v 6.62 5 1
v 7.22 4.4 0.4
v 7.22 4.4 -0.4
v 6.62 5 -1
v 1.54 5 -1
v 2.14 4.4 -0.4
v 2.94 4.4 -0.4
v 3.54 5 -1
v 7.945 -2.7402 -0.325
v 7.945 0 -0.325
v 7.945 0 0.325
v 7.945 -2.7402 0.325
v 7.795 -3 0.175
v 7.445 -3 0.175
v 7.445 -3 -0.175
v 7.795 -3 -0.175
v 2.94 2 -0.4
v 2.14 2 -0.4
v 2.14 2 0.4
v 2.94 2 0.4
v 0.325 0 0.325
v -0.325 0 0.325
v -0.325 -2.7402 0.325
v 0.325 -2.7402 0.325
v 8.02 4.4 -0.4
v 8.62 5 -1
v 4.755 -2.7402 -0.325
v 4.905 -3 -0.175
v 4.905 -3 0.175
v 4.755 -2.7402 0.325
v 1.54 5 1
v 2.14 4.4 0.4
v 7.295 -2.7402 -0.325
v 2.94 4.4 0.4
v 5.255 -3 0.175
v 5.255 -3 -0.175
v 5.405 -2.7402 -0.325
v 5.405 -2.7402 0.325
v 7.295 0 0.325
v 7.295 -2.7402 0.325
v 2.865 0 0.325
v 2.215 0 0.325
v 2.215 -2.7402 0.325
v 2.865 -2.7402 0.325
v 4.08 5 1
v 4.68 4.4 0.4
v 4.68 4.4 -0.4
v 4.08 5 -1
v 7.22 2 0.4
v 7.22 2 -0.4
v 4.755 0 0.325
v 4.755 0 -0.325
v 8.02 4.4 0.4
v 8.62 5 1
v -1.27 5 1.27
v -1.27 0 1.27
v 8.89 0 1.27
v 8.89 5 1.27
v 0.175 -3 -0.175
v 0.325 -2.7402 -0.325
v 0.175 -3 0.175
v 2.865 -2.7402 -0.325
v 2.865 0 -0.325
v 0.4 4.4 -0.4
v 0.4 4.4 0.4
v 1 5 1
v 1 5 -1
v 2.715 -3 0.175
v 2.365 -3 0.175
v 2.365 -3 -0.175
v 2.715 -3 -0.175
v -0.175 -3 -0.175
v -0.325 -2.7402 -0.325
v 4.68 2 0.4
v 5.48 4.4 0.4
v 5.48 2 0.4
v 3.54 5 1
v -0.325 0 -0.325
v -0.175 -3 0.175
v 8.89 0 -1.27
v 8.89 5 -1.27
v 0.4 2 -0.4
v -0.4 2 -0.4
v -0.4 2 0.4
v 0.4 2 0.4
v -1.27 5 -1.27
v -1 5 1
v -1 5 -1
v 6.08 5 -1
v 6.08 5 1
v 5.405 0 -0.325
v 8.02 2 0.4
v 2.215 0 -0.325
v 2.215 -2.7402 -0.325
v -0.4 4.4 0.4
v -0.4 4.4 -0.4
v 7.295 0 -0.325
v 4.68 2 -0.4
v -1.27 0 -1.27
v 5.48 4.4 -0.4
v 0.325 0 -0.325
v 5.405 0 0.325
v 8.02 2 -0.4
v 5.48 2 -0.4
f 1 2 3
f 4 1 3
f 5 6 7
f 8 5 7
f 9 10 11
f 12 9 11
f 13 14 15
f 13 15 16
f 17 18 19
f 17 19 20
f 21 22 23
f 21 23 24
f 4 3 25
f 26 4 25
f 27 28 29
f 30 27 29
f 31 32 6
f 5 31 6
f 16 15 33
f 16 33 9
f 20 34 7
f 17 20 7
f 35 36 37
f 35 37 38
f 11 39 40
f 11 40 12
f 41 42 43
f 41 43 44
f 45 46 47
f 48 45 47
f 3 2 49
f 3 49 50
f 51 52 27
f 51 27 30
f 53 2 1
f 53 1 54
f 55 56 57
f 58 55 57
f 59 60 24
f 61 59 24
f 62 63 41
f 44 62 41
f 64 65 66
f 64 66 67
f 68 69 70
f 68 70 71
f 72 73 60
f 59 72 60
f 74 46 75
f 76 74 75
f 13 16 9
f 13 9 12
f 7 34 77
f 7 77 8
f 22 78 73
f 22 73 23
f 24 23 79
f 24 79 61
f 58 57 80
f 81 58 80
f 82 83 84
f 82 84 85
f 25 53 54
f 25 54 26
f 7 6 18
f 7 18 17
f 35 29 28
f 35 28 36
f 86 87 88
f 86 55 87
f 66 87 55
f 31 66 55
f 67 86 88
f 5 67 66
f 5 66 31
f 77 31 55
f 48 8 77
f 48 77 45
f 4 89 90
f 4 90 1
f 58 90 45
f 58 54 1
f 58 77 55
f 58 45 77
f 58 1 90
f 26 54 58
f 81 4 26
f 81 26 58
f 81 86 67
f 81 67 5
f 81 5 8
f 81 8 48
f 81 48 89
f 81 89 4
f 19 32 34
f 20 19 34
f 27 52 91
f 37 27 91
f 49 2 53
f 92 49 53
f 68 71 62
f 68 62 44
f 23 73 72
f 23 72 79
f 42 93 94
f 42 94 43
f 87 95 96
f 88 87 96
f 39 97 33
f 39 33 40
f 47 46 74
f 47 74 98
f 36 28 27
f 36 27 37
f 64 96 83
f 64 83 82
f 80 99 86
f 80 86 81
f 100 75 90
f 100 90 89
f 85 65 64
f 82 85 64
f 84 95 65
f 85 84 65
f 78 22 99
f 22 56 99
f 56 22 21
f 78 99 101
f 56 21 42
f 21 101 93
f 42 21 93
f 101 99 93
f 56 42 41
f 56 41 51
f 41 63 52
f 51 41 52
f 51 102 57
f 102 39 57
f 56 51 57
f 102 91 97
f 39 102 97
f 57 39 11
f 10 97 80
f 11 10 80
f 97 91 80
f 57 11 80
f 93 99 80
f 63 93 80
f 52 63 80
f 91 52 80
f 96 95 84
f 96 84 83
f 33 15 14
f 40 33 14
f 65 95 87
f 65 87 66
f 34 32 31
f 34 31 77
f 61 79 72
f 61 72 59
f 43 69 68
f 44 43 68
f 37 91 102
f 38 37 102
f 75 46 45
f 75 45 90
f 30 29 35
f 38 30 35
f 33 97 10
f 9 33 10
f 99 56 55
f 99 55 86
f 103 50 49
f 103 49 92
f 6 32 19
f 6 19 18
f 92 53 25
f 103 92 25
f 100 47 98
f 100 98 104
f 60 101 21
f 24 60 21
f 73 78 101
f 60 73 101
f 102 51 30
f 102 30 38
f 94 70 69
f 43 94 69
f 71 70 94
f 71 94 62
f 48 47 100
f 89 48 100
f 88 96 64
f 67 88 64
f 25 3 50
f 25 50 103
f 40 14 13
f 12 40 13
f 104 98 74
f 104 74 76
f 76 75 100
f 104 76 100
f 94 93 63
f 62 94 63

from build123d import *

# Parameters (mm, degrees)
SKETCH1_W                   = 2.54
SKETCH1_H                   = 2.54
BOSS_EXTRUDE1_DEPTH         = 5
SKETCH2_W                   = 0.65
SKETCH2_H                   = 0.65
BOSS_EXTRUDE2_DEPTH         = 3
CHAMFER1_SIZE               = 0.15
CHAMFER1_SIZE2              = 0.259807621
SKETCH3_W                   = 0.8
SKETCH3_H                   = 0.8
CUT_EXTRUDE1_DEPTH          = 3
CHAMFER2_SIZE               = 0.6
LPATTERN1_COUNT             = 4
LPATTERN1_PITCH             = 2.54
CHAMFER1_OF_LPATTERN1_SIZE2 = 0.15
CHAMFER1_OF_LPATTERN1_SIZE  = 0.259807621
CHAMFER2_OF_LPATTERN1_SIZE  = 0.6


with BuildPart() as part:
    # Sketch1 → Boss-Extrude1 (new body)
    with BuildSketch(Plane(origin=(0, 0, 0), x_dir=(1, 0, 0), z_dir=(0, 1, 0))):
        Rectangle(SKETCH1_W, SKETCH1_H)
    boss_extrude1 = extrude(amount=BOSS_EXTRUDE1_DEPTH)

    # Sketch2 → Boss-Extrude2 (add)
    with BuildSketch(Plane.XZ):
        Rectangle(SKETCH2_W, SKETCH2_H)
    boss_extrude2 = extrude(amount=BOSS_EXTRUDE2_DEPTH)

    # Chamfer1
    chamfer1_edges = [part.edges().sort_by_distance(p)[0] for p in [
        (0.325, -3, 0),
        (0, -3, 0.325),
        (-0.325, -3, 0),
        (0, -3, -0.325),
    ]]
    chamfer1_side = [part.faces().sort_by_distance(p)[0] for p in [
        (0, -3, 0),
    ]]
    chamfer(chamfer1_edges, length=CHAMFER1_SIZE, length2=CHAMFER1_SIZE2, reference=chamfer1_side[0])

    # Sketch3 → Cut-Extrude1 (cut)
    with BuildSketch(Plane(origin=(0, 5, 0), x_dir=(1, 0, 0), z_dir=(0, 1, 0))):
        Rectangle(SKETCH3_W, SKETCH3_H)
    cut_extrude1 = extrude(amount=-CUT_EXTRUDE1_DEPTH, mode=Mode.SUBTRACT)

    # Chamfer2
    chamfer2_edges = [part.edges().sort_by_distance(p)[0] for p in [
        (0.4, 5, 0),
        (0, 5, -0.4),
        (-0.4, 5, 0),
        (0, 5, 0.4),
    ]]
    chamfer(chamfer2_edges, length=CHAMFER2_SIZE)

    # LPattern1: Boss-Extrude1, Boss-Extrude2, Cut-Extrude1 ×4
    with Locations(*[(i * LPATTERN1_PITCH, 0, 0) for i in range(1, LPATTERN1_COUNT)]):
        add(boss_extrude1)
        add(boss_extrude2)
        add(cut_extrude1, mode=Mode.SUBTRACT)

    # Chamfer1 of LPattern1
    chamfer1_of_lpattern1_edges = [part.edges().sort_by_distance(p)[0] for p in [
        (2.865, -3, 0),
        (2.54, -3, 0.325),
        (2.215, -3, 0),
        (2.54, -3, -0.325),
        (5.405, -3, 0),
        (5.08, -3, 0.325),
        (4.755, -3, 0),
        (5.08, -3, -0.325),
        (7.945, -3, 0),
        (7.62, -3, 0.325),
        (7.295, -3, 0),
        (7.62, -3, -0.325),
    ]]
    chamfer(chamfer1_of_lpattern1_edges, length=CHAMFER1_OF_LPATTERN1_SIZE, length2=CHAMFER1_OF_LPATTERN1_SIZE2)

    # Chamfer2 of LPattern1
    chamfer2_of_lpattern1_edges = [part.edges().sort_by_distance(p)[0] for p in [
        (2.94, 5, 0),
        (2.54, 5, -0.4),
        (2.14, 5, 0),
        (2.54, 5, 0.4),
        (5.48, 5, 0),
        (5.08, 5, -0.4),
        (4.68, 5, 0),
        (5.08, 5, 0.4),
        (8.02, 5, 0),
        (7.62, 5, -0.4),
        (7.22, 5, 0),
        (7.62, 5, 0.4),
    ]]
    chamfer(chamfer2_of_lpattern1_edges, length=CHAMFER2_OF_LPATTERN1_SIZE)


solid = part.part
